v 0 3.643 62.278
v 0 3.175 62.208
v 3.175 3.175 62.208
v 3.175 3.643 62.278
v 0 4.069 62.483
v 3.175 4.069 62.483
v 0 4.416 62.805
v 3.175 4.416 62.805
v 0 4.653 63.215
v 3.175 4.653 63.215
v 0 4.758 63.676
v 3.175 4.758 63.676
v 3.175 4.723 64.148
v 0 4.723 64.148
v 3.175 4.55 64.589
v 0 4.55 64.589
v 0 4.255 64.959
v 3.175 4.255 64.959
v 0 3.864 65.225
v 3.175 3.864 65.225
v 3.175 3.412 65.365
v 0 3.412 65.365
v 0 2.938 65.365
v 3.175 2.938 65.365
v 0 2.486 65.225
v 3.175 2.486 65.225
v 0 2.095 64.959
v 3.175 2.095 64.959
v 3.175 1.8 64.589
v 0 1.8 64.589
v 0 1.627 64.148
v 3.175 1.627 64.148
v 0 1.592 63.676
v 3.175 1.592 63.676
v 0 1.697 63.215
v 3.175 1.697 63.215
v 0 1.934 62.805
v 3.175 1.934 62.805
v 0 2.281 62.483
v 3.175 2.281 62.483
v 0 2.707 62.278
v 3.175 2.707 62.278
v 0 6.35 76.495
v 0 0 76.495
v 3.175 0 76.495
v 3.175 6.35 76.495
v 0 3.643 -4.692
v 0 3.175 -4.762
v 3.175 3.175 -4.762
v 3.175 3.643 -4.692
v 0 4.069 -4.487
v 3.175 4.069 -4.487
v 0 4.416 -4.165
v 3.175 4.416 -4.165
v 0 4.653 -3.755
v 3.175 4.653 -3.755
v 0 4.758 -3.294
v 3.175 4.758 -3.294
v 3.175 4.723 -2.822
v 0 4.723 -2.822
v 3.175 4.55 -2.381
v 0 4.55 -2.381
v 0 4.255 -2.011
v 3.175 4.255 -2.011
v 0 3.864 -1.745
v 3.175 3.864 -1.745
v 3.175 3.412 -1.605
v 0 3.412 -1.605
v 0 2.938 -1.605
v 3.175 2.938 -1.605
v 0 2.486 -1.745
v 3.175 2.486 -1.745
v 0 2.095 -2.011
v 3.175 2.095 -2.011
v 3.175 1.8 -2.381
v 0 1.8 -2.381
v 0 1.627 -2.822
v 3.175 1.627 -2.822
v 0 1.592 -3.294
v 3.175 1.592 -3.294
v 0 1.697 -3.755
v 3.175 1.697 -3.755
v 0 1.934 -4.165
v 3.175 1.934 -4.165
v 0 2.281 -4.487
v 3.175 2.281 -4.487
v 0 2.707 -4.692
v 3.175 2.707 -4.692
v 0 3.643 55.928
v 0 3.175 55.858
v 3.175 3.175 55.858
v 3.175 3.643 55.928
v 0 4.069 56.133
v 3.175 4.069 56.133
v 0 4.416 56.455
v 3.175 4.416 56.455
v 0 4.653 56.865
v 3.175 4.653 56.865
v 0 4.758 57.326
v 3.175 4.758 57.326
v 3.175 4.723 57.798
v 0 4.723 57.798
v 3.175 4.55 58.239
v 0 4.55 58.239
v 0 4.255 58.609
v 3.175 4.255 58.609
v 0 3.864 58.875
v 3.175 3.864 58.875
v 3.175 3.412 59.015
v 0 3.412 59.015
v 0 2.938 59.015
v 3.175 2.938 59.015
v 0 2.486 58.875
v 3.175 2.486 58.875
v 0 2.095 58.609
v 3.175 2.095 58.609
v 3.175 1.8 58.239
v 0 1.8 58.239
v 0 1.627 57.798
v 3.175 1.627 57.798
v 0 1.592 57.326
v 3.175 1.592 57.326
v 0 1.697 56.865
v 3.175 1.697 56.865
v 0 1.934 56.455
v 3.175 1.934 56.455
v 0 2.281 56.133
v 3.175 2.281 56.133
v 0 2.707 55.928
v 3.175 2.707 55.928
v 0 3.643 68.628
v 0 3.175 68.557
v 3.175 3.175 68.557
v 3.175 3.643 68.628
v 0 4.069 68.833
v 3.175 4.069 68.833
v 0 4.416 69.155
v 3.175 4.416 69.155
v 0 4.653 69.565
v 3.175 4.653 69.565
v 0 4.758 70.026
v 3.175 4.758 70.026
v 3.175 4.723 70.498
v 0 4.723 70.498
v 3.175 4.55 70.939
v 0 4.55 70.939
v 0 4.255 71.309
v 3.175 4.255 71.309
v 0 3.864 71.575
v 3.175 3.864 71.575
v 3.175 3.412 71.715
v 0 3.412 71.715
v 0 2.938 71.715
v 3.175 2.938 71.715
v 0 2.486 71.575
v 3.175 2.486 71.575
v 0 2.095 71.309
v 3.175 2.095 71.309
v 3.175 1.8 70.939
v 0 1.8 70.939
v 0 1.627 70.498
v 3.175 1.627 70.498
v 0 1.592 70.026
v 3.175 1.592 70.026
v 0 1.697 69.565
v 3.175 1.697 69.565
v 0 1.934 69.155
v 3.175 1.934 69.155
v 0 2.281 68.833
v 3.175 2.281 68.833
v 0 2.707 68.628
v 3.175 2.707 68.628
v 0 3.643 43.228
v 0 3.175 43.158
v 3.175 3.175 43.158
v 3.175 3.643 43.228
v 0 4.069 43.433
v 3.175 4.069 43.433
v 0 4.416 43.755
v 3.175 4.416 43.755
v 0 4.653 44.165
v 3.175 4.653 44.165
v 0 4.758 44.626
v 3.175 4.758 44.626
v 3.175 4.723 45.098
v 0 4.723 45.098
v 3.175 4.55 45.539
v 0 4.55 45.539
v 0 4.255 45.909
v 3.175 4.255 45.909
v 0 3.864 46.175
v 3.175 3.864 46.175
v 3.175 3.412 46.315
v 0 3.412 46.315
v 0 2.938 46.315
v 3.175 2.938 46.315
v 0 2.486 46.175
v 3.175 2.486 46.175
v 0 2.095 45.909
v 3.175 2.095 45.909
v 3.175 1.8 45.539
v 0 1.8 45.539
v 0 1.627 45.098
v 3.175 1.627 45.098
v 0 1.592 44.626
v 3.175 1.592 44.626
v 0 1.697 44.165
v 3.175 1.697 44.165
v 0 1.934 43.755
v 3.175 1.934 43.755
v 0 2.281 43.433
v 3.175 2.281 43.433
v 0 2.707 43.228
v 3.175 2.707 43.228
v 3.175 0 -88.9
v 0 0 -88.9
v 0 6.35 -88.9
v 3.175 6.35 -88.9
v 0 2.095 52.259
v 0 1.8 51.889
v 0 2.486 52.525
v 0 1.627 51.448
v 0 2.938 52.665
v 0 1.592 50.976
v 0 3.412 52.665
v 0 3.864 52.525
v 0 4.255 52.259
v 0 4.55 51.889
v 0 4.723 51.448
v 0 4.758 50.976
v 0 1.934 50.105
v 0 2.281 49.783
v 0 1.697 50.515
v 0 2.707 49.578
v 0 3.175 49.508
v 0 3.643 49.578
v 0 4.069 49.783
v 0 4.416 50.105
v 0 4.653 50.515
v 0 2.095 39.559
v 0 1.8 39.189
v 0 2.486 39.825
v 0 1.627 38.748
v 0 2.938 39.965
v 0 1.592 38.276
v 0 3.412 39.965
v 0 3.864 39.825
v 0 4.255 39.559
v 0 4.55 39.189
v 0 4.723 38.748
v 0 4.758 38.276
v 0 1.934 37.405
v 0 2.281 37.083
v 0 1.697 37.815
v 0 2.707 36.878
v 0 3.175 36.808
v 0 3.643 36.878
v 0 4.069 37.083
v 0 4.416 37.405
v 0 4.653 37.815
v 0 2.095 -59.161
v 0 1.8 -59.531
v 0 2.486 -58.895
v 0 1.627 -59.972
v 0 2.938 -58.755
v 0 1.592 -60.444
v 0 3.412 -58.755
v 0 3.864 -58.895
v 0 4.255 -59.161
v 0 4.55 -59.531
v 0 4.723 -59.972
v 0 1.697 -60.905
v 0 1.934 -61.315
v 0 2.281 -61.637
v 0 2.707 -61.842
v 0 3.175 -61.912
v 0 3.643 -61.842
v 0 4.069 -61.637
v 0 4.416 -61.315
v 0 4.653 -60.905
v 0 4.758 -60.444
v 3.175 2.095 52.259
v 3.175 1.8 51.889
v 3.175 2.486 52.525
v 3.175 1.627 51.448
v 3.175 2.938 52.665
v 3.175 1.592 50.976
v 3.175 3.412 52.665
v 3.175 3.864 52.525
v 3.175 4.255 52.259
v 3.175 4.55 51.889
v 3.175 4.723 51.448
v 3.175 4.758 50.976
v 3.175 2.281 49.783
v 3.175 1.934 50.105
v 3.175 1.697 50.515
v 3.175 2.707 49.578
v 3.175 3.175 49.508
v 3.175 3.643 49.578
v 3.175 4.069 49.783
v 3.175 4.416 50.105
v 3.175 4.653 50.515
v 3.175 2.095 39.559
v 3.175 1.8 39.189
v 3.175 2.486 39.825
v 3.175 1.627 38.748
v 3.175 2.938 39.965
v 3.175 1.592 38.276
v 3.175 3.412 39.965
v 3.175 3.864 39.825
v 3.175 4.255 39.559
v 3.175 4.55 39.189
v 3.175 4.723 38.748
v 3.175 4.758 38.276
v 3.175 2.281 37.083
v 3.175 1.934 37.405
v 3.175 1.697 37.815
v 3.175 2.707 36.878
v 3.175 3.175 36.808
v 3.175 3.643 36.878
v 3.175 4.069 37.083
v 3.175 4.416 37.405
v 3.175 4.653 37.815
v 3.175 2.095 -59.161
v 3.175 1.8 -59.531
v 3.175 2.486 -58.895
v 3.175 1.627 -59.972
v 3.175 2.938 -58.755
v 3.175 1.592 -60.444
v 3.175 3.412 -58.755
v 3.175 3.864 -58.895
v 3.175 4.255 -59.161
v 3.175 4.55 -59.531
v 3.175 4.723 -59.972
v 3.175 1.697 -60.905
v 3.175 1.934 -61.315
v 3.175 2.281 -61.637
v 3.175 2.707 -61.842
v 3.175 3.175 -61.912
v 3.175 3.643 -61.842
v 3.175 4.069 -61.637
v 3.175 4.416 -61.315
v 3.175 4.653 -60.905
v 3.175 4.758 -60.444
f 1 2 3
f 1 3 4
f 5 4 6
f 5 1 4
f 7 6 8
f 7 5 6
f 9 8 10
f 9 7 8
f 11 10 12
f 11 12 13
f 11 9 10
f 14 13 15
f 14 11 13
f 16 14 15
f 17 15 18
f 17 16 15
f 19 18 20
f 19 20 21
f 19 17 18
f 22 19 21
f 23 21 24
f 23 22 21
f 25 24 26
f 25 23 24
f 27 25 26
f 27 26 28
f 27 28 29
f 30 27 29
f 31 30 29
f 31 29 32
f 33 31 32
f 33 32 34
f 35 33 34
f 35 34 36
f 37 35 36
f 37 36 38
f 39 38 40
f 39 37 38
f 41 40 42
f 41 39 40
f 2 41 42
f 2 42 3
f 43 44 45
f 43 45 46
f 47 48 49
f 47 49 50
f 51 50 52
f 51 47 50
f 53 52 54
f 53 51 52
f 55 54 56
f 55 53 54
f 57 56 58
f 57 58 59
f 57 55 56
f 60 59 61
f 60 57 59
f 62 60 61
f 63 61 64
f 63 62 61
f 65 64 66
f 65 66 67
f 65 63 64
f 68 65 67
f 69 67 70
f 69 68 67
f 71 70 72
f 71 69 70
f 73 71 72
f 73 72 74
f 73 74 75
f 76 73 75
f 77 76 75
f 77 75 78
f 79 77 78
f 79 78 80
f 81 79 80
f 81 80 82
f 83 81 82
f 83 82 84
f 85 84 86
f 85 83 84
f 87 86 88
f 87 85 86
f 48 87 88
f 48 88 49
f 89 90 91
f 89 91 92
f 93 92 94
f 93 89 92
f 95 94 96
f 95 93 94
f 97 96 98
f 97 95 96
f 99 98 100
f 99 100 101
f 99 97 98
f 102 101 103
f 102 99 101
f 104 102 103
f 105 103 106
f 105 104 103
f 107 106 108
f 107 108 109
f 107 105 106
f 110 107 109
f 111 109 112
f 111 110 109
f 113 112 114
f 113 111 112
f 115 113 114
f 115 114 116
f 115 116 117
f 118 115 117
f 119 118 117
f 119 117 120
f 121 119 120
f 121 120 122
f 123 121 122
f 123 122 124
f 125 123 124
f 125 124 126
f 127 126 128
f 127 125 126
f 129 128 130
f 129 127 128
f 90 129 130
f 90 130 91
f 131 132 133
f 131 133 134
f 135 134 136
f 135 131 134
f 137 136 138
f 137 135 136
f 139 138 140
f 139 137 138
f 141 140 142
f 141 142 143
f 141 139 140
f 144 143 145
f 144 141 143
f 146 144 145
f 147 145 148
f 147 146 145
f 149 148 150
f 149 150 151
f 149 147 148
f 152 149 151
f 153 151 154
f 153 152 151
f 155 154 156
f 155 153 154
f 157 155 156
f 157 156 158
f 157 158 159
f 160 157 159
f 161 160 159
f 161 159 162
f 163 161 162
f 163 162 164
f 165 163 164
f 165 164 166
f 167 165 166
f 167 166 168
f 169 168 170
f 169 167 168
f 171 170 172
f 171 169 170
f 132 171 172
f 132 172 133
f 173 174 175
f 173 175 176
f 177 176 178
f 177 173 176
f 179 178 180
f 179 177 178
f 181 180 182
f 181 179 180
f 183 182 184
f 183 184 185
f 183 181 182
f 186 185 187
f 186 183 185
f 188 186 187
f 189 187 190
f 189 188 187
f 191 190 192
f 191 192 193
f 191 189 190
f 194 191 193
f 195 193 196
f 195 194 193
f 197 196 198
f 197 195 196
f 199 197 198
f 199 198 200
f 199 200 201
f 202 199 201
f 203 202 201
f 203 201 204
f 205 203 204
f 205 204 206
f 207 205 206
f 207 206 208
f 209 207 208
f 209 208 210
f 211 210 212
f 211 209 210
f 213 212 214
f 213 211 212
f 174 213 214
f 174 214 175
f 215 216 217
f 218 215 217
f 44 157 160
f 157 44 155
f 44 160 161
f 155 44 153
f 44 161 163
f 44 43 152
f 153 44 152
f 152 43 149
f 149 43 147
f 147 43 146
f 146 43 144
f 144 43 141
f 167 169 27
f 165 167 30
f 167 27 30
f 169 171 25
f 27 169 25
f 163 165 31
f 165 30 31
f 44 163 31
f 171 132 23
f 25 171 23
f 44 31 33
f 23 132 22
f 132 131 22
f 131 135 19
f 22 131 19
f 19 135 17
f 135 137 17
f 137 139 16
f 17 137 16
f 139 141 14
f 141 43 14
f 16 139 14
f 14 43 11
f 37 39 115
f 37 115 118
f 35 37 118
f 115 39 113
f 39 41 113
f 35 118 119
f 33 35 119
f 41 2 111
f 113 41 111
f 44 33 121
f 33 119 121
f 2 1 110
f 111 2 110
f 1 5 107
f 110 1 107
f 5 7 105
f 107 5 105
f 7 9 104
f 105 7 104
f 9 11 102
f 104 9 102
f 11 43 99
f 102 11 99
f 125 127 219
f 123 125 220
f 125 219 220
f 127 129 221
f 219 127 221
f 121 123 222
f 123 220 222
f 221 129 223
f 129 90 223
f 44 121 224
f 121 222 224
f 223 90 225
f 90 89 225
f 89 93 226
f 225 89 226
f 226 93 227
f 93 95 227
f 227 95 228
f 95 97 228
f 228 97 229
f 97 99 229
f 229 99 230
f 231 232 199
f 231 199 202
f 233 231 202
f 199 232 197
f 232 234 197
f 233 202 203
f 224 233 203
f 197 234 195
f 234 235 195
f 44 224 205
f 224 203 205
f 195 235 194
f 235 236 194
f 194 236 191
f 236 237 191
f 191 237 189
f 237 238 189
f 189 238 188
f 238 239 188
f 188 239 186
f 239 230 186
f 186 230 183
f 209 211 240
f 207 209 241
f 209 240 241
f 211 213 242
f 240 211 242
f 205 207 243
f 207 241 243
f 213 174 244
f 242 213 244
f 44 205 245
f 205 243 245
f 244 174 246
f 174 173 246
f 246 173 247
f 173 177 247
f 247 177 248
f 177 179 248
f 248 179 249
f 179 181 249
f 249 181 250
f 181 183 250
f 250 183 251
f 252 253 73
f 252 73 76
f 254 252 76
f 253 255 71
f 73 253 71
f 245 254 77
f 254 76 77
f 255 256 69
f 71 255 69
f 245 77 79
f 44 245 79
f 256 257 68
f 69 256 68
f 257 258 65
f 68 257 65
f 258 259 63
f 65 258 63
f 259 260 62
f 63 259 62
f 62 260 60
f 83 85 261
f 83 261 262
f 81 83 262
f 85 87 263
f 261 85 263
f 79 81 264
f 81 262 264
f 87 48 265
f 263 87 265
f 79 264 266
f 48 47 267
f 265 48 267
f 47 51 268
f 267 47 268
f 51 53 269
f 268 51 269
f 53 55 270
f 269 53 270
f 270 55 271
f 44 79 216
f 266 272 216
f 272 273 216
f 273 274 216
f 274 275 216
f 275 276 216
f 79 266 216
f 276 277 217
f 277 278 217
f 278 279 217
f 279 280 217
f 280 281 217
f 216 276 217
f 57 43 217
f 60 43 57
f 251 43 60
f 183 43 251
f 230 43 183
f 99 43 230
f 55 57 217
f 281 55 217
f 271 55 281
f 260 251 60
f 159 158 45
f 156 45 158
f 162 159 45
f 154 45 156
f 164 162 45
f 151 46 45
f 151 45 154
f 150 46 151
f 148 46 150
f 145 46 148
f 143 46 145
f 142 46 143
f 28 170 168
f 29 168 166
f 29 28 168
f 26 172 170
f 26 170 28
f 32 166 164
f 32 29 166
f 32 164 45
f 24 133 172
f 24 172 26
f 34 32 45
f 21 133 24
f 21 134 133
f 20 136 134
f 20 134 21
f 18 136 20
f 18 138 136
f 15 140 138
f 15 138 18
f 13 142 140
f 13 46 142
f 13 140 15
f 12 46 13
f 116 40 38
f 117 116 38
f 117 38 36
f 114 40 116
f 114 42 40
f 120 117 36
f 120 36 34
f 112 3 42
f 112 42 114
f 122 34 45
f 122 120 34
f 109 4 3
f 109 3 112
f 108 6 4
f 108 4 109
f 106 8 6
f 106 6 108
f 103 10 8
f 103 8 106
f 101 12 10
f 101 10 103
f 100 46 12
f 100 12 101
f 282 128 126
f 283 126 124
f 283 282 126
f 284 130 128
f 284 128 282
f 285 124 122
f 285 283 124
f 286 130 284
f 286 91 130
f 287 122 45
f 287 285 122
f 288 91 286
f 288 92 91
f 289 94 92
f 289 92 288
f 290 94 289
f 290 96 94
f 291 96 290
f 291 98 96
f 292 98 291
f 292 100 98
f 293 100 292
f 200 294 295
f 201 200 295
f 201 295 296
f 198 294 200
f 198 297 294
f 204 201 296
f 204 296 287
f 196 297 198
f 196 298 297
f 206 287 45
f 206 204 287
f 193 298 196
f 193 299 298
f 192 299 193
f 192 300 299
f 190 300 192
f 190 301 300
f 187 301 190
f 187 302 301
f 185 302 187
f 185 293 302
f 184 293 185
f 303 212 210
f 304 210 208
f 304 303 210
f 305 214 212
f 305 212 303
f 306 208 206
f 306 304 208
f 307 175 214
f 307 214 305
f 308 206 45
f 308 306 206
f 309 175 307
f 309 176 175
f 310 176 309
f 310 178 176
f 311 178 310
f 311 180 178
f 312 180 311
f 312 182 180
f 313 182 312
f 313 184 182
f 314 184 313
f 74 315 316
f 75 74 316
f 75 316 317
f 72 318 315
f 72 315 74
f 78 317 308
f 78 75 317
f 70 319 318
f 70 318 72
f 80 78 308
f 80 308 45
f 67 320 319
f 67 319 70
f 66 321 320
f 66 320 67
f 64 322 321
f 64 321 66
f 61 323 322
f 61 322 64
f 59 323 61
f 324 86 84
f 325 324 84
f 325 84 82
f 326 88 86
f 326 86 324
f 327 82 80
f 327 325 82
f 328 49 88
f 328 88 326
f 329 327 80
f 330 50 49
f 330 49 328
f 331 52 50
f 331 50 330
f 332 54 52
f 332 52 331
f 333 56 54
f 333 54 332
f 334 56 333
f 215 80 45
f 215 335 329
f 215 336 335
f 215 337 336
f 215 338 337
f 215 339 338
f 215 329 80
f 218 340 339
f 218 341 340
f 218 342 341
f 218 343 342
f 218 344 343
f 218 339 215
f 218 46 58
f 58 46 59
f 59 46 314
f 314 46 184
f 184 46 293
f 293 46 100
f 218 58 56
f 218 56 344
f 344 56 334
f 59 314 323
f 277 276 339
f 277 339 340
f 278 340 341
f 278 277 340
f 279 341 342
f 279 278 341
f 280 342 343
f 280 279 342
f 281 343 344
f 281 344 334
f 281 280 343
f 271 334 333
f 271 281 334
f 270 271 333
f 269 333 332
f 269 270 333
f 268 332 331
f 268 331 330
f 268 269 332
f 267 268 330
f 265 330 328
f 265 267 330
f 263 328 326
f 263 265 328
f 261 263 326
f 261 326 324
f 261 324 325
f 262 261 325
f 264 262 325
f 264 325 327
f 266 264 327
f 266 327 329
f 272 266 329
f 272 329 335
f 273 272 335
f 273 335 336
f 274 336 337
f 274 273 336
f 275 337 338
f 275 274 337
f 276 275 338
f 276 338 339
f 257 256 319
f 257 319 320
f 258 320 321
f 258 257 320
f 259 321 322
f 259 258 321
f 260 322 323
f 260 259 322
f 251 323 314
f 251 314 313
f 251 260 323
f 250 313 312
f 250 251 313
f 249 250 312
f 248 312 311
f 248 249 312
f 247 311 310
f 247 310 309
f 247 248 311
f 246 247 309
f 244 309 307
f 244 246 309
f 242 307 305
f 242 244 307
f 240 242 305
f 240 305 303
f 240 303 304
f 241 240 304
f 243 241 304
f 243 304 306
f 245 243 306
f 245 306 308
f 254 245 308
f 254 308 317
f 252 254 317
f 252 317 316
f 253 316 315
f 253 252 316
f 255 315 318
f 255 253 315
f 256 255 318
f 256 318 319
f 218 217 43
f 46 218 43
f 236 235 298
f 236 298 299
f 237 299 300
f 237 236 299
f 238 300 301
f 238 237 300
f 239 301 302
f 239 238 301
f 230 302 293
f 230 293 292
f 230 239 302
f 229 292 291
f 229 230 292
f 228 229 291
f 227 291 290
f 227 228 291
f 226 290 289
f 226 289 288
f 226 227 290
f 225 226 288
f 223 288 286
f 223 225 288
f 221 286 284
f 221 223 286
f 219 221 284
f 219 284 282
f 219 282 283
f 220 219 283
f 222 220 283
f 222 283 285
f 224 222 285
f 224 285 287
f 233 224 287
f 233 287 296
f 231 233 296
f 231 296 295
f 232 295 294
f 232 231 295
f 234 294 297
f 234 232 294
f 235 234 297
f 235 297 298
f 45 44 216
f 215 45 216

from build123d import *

# Parameters (mm, degrees)
SKETCH1_W           = 76.495
SKETCH1_H           = 6.35
SKETCH1_R           = 1.5875
SKETCH1_W_2         = 63.5
SKETCH1_W_3         = 25.4
BOSS_EXTRUDE1_DEPTH = 3.175


with BuildPart() as part:
    # Sketch1 → Boss-Extrude1 (new body)
    with BuildSketch(Plane(origin=(0, 0, 0), x_dir=(0, 0, -1), z_dir=(1, 0, 0))):
        with Locations((-38.2475, 3.175)):
            Rectangle(SKETCH1_W, SKETCH1_H)
        with Locations((-70.145, 3.175)):
            Circle(SKETCH1_R, mode=Mode.SUBTRACT)
        with Locations((-63.795, 3.175)):
            Circle(SKETCH1_R, mode=Mode.SUBTRACT)
        with Locations((-57.445, 3.175)):
            Circle(SKETCH1_R, mode=Mode.SUBTRACT)
        with Locations((-51.095, 3.175)):
            Circle(SKETCH1_R, mode=Mode.SUBTRACT)
        with Locations((-44.745, 3.175)):
            Circle(SKETCH1_R, mode=Mode.SUBTRACT)
        with Locations((-38.395, 3.175)):
            Circle(SKETCH1_R, mode=Mode.SUBTRACT)
        with Locations((31.75, 3.175)):
            Rectangle(SKETCH1_W_2, SKETCH1_H)
        with Locations((3.175, 3.175)):
            Circle(SKETCH1_R, mode=Mode.SUBTRACT)
        with Locations((60.325, 3.175)):
            Circle(SKETCH1_R, mode=Mode.SUBTRACT)
        with Locations((76.2, 3.175)):
            Rectangle(SKETCH1_W_3, SKETCH1_H)
    extrude(amount=BOSS_EXTRUDE1_DEPTH)


solid = part.part
